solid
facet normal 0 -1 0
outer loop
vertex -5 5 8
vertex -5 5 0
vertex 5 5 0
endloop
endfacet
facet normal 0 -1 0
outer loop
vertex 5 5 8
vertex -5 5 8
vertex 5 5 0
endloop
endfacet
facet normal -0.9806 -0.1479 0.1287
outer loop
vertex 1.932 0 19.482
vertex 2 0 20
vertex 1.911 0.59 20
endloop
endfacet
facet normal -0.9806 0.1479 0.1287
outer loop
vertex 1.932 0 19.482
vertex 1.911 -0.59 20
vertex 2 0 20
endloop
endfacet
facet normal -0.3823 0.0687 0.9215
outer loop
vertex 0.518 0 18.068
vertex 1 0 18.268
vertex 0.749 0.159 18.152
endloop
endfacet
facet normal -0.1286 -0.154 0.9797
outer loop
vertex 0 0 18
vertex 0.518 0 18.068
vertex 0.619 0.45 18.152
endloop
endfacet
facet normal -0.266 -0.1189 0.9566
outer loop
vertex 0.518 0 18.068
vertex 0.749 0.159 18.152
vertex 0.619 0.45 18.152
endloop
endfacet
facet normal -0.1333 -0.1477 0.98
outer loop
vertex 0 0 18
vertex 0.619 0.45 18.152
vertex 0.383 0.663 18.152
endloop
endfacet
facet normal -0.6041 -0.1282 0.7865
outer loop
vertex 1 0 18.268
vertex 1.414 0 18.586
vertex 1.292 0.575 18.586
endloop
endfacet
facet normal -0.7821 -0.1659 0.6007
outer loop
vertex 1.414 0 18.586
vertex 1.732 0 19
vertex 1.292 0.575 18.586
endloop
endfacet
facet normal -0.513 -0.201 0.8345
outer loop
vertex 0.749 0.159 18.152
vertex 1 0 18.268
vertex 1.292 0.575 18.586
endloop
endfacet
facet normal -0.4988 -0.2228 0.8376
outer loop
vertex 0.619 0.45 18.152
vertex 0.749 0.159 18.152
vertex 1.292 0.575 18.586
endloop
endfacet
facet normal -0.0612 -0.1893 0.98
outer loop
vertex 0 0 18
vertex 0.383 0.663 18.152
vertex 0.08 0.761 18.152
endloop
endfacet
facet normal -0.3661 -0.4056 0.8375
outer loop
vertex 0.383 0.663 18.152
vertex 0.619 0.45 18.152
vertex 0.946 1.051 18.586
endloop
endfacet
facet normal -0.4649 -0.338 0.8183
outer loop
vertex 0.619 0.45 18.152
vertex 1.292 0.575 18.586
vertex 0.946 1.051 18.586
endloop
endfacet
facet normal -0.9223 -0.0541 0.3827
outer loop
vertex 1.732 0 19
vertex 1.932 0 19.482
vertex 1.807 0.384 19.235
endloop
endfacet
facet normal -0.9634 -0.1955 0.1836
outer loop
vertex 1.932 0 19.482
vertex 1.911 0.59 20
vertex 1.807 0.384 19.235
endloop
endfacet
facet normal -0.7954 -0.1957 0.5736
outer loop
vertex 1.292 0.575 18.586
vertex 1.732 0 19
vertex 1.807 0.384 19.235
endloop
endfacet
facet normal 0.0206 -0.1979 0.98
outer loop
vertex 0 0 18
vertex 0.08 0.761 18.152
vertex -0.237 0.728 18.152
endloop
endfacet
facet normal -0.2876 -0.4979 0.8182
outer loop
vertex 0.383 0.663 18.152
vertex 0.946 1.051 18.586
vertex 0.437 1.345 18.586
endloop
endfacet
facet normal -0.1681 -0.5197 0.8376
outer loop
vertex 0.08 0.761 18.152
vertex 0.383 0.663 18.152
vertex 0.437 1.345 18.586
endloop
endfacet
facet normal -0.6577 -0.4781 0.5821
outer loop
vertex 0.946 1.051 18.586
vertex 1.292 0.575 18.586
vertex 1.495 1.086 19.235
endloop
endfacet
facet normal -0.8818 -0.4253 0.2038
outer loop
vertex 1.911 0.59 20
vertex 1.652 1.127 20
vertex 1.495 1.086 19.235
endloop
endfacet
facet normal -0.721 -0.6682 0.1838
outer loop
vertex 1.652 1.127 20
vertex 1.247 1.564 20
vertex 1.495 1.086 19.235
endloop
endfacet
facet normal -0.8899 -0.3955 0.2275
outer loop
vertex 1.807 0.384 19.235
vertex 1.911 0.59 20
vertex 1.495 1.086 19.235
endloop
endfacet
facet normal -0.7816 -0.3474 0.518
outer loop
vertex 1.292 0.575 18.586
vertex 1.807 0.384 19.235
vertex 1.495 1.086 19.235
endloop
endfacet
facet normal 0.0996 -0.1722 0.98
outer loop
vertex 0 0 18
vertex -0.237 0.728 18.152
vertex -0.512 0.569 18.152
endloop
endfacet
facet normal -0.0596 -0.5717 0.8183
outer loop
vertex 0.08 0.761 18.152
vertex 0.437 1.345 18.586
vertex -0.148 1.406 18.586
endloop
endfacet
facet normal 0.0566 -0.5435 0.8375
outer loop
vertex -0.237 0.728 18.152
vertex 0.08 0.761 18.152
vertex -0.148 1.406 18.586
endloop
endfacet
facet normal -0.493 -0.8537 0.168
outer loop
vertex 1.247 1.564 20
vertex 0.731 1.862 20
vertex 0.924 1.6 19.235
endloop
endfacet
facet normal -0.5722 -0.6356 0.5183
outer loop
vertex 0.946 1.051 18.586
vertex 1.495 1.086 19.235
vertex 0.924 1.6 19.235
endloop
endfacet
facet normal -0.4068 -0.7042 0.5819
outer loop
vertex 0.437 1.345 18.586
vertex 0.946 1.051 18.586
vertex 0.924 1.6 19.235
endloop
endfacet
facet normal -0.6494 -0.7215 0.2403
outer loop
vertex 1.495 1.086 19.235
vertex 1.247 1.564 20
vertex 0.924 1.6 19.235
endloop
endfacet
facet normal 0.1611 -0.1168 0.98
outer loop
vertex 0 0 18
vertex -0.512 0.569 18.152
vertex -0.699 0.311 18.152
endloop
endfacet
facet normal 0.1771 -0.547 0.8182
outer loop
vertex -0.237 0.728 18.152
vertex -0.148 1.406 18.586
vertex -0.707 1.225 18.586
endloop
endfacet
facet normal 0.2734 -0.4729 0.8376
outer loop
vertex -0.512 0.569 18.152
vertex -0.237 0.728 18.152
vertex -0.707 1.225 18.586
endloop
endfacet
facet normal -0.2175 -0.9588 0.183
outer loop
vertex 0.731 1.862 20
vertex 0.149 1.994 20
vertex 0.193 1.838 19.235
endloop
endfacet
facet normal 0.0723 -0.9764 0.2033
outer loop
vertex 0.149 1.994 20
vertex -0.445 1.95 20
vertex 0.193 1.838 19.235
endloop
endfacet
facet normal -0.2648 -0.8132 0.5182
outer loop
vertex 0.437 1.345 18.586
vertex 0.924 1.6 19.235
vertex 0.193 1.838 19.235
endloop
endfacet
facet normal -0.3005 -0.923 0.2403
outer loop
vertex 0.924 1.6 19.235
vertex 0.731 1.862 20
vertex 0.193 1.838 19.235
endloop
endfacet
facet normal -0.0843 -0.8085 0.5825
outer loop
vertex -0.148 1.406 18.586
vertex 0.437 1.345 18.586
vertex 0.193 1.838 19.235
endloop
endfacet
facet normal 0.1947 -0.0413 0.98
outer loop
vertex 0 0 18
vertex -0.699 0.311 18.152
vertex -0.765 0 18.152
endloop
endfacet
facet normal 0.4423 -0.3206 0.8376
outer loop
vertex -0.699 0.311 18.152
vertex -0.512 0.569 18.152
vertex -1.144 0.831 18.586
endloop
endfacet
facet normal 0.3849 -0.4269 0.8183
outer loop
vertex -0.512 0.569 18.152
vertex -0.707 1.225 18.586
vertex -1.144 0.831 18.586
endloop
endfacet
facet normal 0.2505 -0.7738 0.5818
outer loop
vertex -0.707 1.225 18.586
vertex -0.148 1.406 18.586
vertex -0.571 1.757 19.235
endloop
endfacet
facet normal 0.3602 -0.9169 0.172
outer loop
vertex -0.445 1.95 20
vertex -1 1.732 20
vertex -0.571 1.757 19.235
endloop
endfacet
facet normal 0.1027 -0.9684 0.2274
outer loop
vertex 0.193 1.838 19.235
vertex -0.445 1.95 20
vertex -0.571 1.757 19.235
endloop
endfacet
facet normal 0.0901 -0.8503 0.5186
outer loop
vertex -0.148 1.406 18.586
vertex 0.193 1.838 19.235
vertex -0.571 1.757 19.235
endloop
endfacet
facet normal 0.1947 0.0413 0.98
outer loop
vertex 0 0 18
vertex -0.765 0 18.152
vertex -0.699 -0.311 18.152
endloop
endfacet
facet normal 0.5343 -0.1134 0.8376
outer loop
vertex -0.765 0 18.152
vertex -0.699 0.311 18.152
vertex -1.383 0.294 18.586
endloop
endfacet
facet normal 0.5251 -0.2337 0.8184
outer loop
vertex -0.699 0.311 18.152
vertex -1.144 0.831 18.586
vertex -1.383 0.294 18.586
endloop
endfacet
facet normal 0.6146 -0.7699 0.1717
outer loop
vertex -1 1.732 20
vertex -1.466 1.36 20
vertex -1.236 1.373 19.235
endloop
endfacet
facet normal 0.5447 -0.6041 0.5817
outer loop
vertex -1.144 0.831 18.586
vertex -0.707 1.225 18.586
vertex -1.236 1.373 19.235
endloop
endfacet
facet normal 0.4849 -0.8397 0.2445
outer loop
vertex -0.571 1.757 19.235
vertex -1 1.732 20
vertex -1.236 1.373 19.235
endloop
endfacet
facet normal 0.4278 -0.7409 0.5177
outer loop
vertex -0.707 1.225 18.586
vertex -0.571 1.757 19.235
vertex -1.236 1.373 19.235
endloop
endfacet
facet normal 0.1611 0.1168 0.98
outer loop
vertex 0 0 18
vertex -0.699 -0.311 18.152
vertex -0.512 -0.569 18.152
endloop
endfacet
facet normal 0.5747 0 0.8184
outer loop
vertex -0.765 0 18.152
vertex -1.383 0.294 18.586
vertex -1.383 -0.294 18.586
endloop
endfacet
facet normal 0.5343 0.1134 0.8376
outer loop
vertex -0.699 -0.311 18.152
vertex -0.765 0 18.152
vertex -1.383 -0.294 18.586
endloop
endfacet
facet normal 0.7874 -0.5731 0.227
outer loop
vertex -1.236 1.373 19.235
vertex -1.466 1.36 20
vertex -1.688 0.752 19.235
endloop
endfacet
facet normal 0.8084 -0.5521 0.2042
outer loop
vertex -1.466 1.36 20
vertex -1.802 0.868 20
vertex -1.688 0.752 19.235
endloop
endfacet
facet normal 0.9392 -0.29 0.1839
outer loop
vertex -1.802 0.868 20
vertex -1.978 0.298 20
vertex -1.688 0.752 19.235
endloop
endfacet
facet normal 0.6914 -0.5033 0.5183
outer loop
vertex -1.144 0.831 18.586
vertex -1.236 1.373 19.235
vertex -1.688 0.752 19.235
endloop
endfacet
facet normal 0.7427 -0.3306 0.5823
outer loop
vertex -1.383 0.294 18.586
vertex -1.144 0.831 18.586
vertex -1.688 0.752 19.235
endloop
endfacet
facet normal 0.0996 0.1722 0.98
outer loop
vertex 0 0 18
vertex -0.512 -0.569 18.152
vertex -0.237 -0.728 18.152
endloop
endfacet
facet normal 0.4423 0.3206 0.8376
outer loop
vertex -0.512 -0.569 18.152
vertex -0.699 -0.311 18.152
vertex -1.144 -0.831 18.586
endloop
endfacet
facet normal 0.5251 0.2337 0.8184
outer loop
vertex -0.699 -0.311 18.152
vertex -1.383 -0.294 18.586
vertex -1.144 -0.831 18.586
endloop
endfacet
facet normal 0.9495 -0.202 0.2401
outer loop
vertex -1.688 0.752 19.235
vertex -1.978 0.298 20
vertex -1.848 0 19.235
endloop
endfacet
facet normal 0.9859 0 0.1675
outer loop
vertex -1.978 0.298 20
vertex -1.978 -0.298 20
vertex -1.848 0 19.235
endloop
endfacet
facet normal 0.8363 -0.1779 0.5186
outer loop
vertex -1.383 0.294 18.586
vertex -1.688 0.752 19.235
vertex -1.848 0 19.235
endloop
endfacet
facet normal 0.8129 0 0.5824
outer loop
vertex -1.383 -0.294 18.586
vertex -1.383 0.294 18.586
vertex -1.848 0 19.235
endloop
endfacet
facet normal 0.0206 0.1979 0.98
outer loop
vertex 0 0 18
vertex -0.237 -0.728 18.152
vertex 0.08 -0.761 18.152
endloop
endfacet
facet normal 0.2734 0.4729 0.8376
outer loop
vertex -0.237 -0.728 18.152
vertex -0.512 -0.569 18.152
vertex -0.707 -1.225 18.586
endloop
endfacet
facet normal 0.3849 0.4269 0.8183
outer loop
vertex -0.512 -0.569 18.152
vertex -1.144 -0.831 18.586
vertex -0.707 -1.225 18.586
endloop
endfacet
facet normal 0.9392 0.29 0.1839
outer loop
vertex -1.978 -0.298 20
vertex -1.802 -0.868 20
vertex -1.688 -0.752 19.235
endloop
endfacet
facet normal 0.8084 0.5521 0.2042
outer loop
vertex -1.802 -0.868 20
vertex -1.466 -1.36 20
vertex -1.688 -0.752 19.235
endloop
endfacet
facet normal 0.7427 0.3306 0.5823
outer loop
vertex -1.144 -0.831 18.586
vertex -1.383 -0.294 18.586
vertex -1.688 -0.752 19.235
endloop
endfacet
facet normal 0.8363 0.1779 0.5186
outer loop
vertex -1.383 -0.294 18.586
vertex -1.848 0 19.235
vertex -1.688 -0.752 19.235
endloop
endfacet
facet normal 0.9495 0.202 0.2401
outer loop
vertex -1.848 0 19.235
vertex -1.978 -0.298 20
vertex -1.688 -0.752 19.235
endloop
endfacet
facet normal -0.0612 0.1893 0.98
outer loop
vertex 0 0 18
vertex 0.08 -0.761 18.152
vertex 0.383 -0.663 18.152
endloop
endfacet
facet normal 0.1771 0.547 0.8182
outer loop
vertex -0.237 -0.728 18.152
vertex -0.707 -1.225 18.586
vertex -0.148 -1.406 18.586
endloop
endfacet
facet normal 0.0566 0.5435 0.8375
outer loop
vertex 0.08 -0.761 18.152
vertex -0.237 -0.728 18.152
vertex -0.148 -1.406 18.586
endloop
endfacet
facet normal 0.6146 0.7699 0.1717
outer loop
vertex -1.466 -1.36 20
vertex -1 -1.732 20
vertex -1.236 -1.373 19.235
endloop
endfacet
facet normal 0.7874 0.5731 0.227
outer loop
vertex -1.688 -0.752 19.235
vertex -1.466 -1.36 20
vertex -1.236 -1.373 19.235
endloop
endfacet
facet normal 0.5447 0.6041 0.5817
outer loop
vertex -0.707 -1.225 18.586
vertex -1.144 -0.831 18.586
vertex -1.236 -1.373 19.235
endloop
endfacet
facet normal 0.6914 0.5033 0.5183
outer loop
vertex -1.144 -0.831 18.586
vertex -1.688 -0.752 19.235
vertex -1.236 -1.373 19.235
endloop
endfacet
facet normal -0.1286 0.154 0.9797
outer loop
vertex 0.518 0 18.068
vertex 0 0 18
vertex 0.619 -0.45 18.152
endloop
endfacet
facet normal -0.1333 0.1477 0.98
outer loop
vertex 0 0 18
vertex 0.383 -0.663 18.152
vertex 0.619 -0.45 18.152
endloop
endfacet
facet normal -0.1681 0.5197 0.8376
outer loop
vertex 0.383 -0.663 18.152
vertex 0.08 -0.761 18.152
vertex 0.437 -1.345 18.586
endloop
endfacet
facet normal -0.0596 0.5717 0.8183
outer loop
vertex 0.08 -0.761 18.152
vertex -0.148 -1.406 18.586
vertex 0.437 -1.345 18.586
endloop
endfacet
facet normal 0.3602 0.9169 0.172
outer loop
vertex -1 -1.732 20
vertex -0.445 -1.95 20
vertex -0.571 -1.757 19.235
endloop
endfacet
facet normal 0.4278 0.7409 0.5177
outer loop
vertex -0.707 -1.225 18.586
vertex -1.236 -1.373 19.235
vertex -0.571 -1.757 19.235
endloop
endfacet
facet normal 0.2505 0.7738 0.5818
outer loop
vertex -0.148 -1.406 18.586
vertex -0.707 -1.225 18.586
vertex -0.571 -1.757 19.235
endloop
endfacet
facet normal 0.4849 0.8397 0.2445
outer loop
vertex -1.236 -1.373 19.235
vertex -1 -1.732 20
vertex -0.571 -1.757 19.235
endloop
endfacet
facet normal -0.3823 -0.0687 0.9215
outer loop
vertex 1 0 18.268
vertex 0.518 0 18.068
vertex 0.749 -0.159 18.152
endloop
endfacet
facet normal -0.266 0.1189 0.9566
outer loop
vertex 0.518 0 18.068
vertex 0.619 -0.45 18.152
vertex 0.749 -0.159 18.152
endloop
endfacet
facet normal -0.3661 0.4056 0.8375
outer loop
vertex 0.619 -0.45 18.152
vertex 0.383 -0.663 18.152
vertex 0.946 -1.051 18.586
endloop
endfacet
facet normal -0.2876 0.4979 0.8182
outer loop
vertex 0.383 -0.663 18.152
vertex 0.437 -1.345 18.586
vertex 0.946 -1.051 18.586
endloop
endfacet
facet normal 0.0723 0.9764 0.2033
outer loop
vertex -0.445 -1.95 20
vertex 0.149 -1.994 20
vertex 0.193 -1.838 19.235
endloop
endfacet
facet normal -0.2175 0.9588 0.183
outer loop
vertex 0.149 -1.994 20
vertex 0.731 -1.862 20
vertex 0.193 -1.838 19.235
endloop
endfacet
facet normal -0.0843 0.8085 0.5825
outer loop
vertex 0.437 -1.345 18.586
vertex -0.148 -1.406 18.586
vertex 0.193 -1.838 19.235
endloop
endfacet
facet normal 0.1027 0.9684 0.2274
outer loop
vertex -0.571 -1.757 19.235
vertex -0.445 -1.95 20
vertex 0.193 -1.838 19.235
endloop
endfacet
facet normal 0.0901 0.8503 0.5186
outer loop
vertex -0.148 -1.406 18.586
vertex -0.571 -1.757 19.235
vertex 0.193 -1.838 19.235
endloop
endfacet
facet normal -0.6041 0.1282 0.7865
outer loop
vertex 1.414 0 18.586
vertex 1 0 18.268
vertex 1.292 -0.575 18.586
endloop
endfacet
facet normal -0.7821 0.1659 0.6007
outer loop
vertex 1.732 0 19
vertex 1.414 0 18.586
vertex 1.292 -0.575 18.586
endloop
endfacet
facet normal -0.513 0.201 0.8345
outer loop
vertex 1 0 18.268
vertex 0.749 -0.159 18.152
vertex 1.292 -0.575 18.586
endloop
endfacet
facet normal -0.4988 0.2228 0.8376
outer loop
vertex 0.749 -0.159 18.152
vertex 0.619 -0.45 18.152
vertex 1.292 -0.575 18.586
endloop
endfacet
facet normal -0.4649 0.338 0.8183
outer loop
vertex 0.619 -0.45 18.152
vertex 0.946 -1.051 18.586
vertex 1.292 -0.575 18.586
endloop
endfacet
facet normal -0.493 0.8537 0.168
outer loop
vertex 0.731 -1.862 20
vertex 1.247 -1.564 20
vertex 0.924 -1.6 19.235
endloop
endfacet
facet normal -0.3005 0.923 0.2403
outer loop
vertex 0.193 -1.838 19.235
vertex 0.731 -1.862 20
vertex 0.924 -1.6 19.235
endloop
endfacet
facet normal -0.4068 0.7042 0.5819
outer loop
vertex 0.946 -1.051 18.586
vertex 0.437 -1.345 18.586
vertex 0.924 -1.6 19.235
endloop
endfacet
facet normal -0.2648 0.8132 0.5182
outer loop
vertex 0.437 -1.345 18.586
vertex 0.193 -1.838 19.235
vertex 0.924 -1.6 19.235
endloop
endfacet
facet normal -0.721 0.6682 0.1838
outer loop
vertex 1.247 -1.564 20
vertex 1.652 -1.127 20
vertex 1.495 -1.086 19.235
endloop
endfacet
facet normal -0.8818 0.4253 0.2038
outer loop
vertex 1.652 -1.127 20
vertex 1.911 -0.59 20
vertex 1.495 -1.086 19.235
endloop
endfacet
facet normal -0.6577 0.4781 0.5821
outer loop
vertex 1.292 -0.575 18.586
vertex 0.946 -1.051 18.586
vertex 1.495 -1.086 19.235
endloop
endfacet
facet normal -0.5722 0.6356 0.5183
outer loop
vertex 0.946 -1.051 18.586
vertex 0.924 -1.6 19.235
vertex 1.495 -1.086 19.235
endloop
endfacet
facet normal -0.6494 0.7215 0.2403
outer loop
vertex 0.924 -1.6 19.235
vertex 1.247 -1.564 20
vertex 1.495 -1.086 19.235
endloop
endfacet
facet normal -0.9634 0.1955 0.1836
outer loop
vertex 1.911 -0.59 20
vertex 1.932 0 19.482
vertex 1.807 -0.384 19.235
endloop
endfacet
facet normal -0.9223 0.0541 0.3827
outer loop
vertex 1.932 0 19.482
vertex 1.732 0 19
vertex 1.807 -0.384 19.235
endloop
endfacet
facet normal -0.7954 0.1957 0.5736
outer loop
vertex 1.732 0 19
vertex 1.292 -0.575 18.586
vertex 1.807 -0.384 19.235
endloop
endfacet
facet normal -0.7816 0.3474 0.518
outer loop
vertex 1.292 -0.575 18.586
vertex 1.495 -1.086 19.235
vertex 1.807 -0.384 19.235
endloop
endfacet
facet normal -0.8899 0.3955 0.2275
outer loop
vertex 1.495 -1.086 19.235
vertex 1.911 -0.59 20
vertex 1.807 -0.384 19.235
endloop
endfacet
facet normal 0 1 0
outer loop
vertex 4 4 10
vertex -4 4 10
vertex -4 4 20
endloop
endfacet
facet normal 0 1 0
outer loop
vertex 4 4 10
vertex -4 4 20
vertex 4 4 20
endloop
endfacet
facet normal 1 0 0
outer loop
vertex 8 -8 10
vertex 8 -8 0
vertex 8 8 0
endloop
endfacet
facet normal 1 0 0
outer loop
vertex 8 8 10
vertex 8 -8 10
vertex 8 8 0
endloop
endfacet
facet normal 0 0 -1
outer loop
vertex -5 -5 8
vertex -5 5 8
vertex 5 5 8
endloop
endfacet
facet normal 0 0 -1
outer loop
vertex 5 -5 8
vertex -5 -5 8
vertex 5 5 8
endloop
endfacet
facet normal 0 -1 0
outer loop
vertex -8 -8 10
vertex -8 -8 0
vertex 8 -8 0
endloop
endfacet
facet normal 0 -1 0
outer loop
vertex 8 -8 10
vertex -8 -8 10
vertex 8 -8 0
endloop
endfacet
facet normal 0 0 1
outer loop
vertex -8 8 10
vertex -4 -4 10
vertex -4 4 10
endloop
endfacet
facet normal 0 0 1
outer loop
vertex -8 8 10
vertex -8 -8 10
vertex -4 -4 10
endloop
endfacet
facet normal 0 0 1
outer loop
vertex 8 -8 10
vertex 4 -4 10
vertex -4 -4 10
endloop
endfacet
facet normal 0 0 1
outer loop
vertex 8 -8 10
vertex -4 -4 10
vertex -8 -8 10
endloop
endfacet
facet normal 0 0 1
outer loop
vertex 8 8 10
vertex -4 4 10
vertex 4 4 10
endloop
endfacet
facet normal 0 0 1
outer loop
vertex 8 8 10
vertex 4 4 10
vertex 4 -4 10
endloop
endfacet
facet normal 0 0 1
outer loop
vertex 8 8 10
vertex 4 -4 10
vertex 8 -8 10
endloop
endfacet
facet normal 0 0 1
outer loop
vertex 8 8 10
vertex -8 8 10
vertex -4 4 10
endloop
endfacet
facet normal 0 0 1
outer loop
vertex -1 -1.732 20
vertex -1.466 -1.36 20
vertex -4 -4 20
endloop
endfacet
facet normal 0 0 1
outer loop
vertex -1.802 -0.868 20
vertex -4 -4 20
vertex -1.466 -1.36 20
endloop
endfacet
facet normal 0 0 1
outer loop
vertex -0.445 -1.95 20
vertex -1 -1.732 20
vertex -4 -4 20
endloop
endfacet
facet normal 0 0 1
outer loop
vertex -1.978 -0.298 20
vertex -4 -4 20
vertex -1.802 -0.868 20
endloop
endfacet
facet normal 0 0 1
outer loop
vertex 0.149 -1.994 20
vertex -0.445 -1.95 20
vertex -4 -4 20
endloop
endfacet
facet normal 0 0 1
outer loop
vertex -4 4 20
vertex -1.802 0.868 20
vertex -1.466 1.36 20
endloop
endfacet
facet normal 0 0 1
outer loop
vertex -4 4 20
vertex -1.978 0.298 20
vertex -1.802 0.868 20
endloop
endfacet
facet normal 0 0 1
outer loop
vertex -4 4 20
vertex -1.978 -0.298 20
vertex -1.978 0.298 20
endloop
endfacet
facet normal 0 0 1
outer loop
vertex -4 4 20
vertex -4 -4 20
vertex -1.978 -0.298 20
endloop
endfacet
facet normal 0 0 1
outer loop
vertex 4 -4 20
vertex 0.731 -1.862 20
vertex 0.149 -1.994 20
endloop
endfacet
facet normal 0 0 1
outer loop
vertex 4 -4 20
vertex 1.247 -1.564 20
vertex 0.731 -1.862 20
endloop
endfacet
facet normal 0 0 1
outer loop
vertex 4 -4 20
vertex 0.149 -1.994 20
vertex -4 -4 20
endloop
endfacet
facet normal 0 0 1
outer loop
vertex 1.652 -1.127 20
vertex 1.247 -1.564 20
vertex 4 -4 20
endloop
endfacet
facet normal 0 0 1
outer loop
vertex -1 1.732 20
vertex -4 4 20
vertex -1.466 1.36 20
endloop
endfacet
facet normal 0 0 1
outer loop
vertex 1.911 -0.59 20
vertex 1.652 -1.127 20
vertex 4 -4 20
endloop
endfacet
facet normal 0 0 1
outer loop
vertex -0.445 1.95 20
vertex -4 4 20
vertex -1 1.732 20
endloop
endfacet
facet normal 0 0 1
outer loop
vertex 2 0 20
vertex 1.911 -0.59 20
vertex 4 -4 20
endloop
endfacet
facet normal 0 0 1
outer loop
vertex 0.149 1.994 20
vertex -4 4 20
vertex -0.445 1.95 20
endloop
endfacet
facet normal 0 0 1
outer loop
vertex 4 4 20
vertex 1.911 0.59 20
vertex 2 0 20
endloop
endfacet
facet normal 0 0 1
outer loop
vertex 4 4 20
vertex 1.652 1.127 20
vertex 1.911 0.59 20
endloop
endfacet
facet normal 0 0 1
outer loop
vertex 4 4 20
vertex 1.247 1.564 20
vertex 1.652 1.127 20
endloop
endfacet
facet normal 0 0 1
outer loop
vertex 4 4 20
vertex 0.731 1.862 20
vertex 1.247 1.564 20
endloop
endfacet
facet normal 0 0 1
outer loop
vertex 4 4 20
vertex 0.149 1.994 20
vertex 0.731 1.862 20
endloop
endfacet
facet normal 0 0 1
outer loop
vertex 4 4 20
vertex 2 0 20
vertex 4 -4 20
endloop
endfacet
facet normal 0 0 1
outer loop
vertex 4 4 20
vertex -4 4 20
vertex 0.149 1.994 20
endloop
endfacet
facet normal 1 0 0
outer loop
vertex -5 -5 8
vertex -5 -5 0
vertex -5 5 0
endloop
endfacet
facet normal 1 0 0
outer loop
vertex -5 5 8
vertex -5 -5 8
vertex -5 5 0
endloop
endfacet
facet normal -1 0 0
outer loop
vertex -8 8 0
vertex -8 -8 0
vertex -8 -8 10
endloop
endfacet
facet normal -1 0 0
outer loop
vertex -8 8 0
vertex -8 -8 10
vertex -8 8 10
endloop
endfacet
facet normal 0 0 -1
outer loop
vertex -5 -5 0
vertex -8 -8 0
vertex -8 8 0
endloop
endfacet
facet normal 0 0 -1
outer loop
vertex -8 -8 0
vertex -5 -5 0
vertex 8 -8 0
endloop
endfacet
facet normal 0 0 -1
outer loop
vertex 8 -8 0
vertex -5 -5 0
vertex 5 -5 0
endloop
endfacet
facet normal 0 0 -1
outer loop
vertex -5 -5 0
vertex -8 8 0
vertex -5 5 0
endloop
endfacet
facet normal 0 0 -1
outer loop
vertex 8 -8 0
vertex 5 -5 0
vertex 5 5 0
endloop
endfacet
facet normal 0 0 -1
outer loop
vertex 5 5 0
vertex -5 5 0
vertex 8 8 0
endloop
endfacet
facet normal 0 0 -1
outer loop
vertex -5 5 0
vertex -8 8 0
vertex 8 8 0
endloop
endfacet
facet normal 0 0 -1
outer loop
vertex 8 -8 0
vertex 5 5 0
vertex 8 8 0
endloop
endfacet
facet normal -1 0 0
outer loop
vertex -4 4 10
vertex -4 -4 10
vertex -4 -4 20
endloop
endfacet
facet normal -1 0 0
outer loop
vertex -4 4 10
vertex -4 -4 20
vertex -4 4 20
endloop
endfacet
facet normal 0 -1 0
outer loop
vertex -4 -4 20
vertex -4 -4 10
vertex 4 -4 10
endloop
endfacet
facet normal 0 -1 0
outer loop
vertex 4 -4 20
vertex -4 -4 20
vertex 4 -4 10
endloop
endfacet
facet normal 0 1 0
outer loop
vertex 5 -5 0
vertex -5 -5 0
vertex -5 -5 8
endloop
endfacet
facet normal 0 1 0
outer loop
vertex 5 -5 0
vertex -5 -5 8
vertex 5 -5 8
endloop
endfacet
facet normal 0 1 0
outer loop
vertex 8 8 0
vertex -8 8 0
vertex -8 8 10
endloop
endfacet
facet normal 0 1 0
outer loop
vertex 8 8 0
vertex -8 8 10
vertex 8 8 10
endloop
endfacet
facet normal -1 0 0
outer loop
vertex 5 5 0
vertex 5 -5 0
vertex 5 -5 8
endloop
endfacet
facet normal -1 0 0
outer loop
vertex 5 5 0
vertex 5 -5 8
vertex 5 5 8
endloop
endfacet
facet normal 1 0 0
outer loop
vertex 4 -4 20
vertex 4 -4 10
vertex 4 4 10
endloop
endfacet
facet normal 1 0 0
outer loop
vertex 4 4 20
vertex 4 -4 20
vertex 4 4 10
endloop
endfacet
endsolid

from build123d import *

# Parameters (mm, degrees)
BOX003_W     = 10
BOX003_H     = 10
BOX003_DEPTH = 8
BOX002_W     = 8
BOX002_H     = 8
BOX002_DEPTH = 20
BOX_W        = 16
BOX_H        = 16
BOX_DEPTH    = 10


with BuildPart() as cube001:
    # Box003 → Box003 (new body)
    with BuildSketch(Plane(origin=(-5, -5, 0), x_dir=(1, 0, 0), z_dir=(0, 0, 1))):
        with Locations((5, 5)):
            Rectangle(BOX003_W, BOX003_H)
    extrude(amount=BOX003_DEPTH)


with BuildPart() as body:
    # Box002 → Box002 (join)
    with BuildSketch(Plane(origin=(-4, -4, 0), x_dir=(1, 0, 0), z_dir=(0, 0, 1))):
        with Locations((4, 4)):
            Rectangle(BOX002_W, BOX002_H)
    extrude(amount=BOX002_DEPTH)

    # Sphere → Sphere (revolve, cut)
    with BuildSketch(Plane(origin=(0, 0, 20), x_dir=(1, 0, 0), z_dir=(0, -1, 0))):
        with BuildLine():
            ThreePointArc((0, -2), (2, 0), (0, 2))
            Line((0, 2), (0, -2))
        make_face()
    revolve(axis=Axis((0, 0, 20), (0, 0, 1)), mode=Mode.SUBTRACT)


with BuildPart() as cut:
    # Box → Box (new body)
    with BuildSketch(Plane(origin=(-8, -8, 0), x_dir=(1, 0, 0), z_dir=(0, 0, 1))):
        with Locations((8, 8)):
            Rectangle(BOX_W, BOX_H)
    extrude(amount=BOX_DEPTH)

    # Fusion: union Body
    add(body.part)

    # Cut: cut Cube001
    add(cube001.part, mode=Mode.SUBTRACT)


solid = cut.part
